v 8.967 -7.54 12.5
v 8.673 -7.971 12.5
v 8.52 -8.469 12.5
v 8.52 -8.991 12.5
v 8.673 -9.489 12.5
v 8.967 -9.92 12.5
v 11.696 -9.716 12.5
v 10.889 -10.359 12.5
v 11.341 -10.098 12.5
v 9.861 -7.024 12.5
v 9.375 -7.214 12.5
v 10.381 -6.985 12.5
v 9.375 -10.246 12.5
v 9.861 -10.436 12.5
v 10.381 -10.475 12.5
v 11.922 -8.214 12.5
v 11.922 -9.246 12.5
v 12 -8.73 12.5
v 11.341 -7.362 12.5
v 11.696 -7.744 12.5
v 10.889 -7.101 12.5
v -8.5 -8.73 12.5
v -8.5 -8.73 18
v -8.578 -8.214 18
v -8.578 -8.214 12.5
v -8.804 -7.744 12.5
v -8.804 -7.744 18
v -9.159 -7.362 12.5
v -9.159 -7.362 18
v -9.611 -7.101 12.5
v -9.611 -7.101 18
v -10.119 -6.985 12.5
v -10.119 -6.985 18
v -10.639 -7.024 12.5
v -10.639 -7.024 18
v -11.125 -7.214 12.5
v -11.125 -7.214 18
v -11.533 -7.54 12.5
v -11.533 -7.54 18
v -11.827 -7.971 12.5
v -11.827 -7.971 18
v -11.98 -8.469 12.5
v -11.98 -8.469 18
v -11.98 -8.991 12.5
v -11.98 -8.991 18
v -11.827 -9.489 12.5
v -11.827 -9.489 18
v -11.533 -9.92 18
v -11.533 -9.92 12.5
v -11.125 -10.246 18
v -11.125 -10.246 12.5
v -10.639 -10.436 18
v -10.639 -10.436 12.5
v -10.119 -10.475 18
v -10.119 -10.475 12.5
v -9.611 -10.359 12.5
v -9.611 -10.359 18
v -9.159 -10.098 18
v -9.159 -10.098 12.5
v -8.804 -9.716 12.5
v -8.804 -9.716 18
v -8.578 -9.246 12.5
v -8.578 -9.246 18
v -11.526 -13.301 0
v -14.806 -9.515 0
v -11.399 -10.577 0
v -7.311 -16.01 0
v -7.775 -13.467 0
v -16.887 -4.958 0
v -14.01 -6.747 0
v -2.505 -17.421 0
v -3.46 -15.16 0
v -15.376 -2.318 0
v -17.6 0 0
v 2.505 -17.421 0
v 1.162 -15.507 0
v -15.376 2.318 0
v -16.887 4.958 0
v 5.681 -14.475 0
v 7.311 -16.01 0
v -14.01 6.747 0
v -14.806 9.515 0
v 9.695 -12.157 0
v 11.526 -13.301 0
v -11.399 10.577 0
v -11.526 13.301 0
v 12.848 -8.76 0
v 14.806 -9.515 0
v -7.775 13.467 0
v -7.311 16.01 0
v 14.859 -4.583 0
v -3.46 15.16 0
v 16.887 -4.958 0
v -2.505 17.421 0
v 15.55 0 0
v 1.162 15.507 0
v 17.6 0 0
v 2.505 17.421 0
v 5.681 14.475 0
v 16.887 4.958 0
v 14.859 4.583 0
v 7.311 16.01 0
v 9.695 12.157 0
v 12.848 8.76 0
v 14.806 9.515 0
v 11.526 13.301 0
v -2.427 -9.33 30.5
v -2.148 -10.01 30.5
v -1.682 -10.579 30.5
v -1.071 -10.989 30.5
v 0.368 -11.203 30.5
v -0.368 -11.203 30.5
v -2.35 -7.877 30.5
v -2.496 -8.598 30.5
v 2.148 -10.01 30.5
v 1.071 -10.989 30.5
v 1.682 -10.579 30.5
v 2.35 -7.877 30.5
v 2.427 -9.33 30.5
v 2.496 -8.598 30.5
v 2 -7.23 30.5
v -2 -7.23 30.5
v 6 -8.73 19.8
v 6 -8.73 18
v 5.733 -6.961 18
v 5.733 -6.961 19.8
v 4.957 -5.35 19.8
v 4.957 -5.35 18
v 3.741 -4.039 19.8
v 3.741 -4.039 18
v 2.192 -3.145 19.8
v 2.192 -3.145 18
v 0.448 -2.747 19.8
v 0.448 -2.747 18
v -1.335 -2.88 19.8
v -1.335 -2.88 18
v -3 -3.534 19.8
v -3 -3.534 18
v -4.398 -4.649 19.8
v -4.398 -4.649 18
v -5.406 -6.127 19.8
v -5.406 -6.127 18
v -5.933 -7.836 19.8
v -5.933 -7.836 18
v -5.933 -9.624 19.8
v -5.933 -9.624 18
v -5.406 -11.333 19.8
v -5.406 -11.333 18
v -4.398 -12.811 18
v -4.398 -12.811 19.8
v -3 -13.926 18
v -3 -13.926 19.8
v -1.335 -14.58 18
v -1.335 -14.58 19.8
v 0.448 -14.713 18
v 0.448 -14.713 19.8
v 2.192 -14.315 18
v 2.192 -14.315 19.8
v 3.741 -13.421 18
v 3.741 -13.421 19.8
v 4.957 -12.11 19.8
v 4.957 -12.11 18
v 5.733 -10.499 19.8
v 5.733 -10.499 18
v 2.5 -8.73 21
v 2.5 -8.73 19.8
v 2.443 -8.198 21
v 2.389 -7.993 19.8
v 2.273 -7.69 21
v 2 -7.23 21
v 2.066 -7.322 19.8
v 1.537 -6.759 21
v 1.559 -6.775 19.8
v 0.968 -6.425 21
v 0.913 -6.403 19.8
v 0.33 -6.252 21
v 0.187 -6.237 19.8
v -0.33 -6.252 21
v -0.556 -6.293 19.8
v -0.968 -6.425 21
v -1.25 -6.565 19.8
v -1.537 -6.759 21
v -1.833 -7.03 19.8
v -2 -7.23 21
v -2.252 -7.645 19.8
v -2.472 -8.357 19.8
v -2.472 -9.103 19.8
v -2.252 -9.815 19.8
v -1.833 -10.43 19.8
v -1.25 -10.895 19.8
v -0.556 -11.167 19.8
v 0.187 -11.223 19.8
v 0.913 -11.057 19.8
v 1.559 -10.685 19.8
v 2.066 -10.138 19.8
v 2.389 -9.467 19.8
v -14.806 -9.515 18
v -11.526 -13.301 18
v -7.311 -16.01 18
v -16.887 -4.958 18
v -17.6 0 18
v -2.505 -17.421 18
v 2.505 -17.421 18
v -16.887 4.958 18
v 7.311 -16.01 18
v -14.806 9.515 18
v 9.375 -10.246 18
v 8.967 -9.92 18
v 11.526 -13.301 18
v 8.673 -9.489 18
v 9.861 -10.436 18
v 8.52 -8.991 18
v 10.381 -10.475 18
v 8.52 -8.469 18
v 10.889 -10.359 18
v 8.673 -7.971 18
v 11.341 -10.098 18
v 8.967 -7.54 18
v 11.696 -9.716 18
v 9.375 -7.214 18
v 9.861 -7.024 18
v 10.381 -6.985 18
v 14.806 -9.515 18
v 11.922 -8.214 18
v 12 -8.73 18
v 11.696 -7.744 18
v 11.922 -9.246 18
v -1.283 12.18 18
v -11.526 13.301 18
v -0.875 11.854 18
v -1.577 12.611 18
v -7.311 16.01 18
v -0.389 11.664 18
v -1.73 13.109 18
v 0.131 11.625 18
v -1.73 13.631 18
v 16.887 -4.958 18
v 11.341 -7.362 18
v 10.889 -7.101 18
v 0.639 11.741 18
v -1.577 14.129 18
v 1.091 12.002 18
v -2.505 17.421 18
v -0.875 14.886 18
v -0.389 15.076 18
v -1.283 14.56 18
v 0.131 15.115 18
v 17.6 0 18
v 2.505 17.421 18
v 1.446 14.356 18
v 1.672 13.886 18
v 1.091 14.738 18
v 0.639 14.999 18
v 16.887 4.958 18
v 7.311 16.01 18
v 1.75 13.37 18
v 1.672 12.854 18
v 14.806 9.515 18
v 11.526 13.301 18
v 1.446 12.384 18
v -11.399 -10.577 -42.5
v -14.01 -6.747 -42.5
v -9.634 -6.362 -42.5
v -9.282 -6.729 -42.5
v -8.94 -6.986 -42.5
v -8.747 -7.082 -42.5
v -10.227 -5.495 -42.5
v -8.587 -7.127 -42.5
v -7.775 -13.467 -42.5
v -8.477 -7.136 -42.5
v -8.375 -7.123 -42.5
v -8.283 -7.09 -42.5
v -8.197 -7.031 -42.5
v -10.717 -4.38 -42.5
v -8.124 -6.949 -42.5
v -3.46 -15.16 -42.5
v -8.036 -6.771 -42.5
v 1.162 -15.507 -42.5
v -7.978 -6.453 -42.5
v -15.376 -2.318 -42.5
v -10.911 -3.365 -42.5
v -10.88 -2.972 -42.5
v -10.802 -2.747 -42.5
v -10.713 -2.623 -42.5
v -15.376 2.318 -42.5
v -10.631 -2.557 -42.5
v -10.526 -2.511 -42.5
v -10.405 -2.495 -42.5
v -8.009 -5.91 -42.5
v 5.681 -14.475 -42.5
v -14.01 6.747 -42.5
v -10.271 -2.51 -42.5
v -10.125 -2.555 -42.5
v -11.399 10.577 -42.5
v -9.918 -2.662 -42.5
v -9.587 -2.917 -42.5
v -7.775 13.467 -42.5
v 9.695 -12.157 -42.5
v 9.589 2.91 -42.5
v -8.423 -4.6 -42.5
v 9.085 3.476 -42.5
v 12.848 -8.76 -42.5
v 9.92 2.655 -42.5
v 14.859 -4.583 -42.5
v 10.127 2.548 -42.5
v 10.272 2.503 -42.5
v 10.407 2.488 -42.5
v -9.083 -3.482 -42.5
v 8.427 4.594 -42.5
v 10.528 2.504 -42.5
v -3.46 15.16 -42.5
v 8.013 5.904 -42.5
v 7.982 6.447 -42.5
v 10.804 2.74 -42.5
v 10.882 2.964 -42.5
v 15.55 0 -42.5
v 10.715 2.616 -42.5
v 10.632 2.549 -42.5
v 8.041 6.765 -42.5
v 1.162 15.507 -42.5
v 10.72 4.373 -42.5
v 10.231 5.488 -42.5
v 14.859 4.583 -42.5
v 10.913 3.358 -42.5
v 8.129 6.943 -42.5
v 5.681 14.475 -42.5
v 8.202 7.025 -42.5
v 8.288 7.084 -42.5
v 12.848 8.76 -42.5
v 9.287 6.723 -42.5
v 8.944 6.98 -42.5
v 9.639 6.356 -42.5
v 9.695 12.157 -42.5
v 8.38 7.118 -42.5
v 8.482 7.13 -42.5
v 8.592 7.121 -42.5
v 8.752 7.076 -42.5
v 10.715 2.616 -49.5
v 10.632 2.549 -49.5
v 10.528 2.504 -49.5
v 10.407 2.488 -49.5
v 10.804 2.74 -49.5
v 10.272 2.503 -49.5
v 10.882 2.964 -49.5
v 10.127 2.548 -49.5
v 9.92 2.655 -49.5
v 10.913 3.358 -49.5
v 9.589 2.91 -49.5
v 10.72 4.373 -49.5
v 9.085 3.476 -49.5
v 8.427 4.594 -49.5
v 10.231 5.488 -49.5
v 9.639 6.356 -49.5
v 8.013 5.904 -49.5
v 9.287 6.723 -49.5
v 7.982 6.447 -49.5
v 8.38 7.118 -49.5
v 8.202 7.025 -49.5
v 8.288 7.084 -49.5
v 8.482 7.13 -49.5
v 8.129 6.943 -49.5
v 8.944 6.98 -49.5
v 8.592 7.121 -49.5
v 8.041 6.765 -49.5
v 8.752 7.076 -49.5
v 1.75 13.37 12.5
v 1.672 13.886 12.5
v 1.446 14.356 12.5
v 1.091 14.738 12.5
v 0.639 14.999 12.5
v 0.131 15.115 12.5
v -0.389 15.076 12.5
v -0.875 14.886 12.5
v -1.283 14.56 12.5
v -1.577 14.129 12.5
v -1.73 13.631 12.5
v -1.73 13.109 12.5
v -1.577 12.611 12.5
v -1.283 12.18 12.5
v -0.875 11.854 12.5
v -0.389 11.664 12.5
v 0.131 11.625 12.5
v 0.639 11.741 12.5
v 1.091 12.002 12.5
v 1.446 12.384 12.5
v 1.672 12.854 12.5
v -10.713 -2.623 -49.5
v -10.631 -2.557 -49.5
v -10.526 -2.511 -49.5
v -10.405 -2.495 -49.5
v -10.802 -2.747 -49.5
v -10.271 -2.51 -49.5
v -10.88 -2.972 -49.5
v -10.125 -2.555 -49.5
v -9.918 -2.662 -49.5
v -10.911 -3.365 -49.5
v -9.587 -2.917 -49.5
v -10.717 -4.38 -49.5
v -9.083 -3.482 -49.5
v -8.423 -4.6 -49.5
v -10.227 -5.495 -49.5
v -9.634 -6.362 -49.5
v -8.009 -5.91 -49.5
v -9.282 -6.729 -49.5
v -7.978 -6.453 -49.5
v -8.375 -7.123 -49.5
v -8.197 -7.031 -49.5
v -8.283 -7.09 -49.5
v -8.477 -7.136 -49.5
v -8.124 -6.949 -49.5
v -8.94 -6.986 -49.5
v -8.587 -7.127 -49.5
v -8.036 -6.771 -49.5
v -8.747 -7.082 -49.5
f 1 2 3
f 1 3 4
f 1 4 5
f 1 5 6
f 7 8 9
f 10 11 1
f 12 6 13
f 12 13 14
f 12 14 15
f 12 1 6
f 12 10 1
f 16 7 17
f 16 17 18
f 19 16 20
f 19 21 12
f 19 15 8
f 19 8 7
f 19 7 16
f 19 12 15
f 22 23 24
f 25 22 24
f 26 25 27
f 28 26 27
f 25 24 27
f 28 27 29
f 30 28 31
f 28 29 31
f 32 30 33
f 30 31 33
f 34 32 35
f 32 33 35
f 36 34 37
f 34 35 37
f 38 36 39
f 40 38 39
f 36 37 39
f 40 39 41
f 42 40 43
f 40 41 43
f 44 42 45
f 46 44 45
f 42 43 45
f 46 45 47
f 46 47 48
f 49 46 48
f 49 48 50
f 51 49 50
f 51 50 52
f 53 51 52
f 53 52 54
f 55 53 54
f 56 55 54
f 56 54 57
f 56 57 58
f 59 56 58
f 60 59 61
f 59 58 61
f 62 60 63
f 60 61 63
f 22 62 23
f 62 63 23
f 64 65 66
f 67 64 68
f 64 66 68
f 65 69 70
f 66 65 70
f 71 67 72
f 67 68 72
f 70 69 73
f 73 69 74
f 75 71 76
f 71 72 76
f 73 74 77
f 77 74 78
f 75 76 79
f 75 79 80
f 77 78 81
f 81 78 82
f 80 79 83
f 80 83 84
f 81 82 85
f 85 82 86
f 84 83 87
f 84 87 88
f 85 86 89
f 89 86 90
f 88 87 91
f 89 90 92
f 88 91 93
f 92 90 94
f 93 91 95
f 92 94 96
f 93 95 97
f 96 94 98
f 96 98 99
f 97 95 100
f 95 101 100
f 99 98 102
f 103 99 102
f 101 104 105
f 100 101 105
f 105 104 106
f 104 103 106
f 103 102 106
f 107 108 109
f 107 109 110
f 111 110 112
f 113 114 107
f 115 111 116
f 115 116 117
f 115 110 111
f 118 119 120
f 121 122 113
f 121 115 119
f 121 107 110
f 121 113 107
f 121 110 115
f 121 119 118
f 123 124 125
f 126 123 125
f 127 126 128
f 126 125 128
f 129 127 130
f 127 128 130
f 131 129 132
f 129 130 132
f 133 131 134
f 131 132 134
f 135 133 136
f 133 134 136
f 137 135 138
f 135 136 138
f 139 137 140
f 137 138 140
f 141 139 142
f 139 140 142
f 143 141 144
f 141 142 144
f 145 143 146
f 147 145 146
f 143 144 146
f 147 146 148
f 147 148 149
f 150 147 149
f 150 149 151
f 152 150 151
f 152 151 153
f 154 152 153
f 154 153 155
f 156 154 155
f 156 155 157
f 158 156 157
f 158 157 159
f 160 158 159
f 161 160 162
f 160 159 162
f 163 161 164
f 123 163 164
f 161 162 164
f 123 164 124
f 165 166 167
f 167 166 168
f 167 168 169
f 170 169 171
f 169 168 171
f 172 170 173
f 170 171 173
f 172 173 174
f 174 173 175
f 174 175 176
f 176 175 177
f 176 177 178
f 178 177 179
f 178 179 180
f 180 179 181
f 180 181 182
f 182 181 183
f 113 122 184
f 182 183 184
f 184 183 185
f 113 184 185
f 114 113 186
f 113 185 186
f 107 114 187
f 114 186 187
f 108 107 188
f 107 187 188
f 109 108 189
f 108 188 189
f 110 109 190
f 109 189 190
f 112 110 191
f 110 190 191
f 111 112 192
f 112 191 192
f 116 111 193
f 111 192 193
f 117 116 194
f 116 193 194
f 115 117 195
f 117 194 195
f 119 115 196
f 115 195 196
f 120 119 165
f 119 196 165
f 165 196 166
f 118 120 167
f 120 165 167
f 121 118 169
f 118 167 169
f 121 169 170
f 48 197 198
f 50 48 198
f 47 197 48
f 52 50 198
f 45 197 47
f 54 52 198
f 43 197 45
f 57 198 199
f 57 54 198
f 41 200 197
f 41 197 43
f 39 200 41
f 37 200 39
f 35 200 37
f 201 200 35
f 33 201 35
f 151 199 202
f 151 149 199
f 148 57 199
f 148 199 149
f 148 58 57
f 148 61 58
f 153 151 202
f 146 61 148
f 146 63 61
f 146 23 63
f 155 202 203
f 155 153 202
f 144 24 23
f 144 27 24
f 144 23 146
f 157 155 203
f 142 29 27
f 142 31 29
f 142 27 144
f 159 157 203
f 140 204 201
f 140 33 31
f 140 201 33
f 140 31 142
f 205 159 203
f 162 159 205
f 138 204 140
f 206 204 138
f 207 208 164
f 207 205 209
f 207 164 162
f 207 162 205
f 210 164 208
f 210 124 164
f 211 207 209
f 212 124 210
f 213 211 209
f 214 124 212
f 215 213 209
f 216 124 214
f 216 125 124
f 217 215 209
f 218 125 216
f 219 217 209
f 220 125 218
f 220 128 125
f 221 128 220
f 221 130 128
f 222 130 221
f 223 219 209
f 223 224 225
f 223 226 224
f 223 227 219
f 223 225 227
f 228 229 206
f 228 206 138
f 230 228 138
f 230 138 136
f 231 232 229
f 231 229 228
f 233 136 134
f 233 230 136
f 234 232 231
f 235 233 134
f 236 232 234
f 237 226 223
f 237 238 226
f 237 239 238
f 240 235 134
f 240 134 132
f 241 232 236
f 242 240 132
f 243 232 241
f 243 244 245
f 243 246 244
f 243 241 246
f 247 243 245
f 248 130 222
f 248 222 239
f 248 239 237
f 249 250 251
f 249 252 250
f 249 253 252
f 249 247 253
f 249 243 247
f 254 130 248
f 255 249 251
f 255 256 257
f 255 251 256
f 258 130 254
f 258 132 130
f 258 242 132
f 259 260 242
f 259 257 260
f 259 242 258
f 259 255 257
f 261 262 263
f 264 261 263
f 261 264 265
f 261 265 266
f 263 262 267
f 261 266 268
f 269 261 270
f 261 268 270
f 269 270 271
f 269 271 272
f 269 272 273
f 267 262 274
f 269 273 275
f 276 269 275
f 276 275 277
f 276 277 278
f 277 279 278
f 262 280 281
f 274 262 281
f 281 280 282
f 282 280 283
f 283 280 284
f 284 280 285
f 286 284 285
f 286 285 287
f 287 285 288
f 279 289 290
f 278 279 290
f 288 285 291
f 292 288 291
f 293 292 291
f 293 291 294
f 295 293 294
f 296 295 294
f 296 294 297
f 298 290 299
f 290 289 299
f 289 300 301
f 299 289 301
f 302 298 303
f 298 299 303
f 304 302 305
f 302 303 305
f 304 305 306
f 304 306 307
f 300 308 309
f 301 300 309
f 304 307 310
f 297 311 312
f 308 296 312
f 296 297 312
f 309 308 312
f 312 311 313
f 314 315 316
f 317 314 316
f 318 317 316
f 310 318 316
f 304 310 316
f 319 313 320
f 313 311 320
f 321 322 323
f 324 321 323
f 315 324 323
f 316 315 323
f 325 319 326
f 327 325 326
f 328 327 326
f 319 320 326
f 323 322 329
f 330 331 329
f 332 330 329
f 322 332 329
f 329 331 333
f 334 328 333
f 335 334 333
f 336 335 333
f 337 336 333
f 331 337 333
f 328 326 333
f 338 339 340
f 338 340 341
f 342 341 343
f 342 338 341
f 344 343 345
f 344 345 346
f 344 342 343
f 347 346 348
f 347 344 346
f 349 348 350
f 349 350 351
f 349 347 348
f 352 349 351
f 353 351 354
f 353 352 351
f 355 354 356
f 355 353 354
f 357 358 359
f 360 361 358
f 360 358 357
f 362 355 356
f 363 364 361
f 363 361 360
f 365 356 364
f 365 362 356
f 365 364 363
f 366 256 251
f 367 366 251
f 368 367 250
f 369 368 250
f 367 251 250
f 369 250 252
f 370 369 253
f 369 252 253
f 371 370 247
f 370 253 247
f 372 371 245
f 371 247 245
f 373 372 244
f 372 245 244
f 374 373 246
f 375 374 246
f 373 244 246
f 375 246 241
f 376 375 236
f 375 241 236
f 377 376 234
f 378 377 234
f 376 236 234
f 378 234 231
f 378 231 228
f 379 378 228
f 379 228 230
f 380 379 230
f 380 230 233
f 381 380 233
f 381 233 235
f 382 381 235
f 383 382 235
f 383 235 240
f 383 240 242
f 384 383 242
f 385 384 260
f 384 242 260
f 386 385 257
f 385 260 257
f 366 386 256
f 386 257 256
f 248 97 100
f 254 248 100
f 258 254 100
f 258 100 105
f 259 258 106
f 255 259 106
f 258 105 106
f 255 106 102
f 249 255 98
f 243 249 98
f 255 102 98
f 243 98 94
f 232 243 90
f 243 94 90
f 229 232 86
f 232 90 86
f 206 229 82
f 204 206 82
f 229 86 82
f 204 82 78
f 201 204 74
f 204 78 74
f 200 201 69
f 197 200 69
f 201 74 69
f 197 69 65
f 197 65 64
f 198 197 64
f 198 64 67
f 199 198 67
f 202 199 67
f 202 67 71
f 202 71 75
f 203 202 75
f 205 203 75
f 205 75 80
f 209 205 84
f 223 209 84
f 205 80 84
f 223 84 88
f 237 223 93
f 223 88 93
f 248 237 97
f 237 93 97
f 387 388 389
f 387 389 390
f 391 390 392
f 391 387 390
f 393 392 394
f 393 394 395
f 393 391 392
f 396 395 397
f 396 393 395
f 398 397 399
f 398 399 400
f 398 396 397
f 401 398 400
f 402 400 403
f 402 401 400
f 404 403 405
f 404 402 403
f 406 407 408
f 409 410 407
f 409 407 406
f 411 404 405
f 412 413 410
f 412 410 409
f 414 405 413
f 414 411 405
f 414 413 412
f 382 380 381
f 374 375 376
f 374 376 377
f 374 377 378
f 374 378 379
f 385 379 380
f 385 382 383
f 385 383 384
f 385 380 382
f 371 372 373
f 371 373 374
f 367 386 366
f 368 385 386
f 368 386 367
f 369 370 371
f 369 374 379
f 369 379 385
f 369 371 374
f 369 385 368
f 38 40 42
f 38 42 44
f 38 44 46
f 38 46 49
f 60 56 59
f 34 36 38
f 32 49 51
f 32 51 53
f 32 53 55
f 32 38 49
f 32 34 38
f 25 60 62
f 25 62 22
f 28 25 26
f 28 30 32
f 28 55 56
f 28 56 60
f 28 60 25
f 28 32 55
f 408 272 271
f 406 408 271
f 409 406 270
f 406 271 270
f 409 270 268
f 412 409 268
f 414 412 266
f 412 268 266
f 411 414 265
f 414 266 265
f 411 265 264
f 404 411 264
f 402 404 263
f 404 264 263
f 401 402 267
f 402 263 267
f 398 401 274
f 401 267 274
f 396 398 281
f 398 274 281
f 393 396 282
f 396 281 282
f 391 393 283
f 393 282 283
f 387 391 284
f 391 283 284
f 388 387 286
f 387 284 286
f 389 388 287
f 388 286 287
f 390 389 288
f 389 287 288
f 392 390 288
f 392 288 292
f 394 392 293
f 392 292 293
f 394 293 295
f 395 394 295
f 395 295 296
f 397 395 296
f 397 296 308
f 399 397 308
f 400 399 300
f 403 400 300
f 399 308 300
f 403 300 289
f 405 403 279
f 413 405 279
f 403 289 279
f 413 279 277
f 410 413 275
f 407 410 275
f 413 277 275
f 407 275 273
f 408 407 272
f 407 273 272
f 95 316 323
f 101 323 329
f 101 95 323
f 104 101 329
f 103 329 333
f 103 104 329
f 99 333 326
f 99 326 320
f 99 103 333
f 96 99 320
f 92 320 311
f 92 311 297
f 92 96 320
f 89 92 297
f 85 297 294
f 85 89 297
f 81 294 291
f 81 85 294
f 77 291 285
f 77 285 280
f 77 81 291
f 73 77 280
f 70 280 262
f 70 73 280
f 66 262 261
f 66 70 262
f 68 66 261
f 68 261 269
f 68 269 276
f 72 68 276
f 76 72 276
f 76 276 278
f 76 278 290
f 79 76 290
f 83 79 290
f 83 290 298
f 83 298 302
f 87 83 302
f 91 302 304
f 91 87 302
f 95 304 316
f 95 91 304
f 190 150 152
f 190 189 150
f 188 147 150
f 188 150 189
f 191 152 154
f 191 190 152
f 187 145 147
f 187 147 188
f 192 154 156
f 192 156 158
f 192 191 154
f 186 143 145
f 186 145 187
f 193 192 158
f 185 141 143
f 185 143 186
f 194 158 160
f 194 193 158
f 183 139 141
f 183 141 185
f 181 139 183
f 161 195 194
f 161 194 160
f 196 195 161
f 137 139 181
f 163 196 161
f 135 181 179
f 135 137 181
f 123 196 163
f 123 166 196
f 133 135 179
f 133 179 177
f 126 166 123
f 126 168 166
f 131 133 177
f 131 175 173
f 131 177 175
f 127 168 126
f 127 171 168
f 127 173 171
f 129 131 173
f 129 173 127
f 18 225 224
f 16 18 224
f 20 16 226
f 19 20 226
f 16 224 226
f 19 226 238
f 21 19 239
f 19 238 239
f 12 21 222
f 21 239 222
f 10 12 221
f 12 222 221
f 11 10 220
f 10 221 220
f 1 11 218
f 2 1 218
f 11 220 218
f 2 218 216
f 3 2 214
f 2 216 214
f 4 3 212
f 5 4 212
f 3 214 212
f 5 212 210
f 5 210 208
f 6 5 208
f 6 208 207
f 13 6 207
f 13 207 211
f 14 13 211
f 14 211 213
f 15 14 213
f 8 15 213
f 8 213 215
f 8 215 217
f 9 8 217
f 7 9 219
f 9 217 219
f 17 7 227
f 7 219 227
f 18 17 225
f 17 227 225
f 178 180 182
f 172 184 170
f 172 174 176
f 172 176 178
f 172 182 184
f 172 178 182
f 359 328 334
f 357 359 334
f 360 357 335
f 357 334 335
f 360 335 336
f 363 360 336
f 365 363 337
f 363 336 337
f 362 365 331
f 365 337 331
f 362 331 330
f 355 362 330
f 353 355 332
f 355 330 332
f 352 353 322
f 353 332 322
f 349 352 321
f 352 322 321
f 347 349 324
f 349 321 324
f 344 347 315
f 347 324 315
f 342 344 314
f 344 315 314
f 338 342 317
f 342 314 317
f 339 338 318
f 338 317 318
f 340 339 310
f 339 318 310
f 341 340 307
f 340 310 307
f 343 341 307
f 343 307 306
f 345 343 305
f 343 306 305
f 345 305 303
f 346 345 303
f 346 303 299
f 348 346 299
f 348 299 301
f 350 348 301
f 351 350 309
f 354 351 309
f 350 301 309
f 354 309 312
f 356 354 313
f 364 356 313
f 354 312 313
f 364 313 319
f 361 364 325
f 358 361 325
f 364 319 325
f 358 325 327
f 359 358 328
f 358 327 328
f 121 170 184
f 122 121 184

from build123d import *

# Parameters (mm, degrees)
SKETCH1_R              = 15.55
BACK_DEPTH             = 42.5
SKETCH3_R              = 17.6
FRONT_DEPTH            = 18
SKETCH4_R              = 6
SHAFTBEARING_DEPTH     = 1.8
SKETCH5_R              = 1.75
FRONTSCREWHOLES_DEPTH  = 5.5
SKETCH6_R              = 2.5
ROUNDPARTOFSHAFT_DEPTH = 1.2
FLATPARTOFSHAFT_DEPTH  = 9.5
SKETCH8_RX             = 2.553008369
SKETCH8_RY             = 1.011966428
PWR_AND_GND_DEPTH      = 7


with BuildPart() as part:
    # Sketch1 → Back (new body)
    with BuildSketch(Plane.XY):
        Circle(SKETCH1_R)
    extrude(amount=-BACK_DEPTH)

    # Sketch3 → Front (add)
    with BuildSketch(Plane.XY):
        Circle(SKETCH3_R)
    extrude(amount=FRONT_DEPTH)

    # Sketch4 → ShaftBearing (add)
    with BuildSketch(Plane.XY.offset(18)):
        with Locations((0, -8.73)):
            Circle(SKETCH4_R)
    extrude(amount=SHAFTBEARING_DEPTH)

    # Sketch5 → frontScrewHoles (cut)
    with BuildSketch(Plane.XY.offset(18)):
        with Locations((-10.25, -8.73)):
            Circle(SKETCH5_R)
        with Locations((10.250000074, -8.73)):
            Circle(SKETCH5_R)
        with Locations((0, 13.37)):
            Circle(SKETCH5_R)
    extrude(amount=-FRONTSCREWHOLES_DEPTH, mode=Mode.SUBTRACT)

    # Sketch6 → RoundPartofShaft (add)
    with BuildSketch(Plane.XY.offset(19.8)):
        with Locations((0, -8.73)):
            Circle(SKETCH6_R)
    extrude(amount=ROUNDPARTOFSHAFT_DEPTH)

    # Sketch7 → FlatPartofShaft (add)
    with BuildSketch(Plane.XY.offset(21)):
        with BuildLine():
            Line((2, -7.23), (-2, -7.23))
            ThreePointArc((-2, -7.23), (0, -11.23), (2, -7.23))
        make_face()
    extrude(amount=FLATPARTOFSHAFT_DEPTH)

    # Sketch8 → Pwr And Gnd (add)
    with BuildSketch(Plane(origin=(0, 0, -42.5), x_dir=(-1, 0, 0), z_dir=(0, 0, -1))):
        with Locations(Location((9.443035065, -4.815505038), (0, 0, -117.019449203))):
            Ellipse(SKETCH8_RX, SKETCH8_RY)
        with Locations(Location((-9.44630216, 4.809093002), (0, 0, 63.019449203))):
            Ellipse(SKETCH8_RX, SKETCH8_RY)
    extrude(amount=PWR_AND_GND_DEPTH)


solid = part.part
